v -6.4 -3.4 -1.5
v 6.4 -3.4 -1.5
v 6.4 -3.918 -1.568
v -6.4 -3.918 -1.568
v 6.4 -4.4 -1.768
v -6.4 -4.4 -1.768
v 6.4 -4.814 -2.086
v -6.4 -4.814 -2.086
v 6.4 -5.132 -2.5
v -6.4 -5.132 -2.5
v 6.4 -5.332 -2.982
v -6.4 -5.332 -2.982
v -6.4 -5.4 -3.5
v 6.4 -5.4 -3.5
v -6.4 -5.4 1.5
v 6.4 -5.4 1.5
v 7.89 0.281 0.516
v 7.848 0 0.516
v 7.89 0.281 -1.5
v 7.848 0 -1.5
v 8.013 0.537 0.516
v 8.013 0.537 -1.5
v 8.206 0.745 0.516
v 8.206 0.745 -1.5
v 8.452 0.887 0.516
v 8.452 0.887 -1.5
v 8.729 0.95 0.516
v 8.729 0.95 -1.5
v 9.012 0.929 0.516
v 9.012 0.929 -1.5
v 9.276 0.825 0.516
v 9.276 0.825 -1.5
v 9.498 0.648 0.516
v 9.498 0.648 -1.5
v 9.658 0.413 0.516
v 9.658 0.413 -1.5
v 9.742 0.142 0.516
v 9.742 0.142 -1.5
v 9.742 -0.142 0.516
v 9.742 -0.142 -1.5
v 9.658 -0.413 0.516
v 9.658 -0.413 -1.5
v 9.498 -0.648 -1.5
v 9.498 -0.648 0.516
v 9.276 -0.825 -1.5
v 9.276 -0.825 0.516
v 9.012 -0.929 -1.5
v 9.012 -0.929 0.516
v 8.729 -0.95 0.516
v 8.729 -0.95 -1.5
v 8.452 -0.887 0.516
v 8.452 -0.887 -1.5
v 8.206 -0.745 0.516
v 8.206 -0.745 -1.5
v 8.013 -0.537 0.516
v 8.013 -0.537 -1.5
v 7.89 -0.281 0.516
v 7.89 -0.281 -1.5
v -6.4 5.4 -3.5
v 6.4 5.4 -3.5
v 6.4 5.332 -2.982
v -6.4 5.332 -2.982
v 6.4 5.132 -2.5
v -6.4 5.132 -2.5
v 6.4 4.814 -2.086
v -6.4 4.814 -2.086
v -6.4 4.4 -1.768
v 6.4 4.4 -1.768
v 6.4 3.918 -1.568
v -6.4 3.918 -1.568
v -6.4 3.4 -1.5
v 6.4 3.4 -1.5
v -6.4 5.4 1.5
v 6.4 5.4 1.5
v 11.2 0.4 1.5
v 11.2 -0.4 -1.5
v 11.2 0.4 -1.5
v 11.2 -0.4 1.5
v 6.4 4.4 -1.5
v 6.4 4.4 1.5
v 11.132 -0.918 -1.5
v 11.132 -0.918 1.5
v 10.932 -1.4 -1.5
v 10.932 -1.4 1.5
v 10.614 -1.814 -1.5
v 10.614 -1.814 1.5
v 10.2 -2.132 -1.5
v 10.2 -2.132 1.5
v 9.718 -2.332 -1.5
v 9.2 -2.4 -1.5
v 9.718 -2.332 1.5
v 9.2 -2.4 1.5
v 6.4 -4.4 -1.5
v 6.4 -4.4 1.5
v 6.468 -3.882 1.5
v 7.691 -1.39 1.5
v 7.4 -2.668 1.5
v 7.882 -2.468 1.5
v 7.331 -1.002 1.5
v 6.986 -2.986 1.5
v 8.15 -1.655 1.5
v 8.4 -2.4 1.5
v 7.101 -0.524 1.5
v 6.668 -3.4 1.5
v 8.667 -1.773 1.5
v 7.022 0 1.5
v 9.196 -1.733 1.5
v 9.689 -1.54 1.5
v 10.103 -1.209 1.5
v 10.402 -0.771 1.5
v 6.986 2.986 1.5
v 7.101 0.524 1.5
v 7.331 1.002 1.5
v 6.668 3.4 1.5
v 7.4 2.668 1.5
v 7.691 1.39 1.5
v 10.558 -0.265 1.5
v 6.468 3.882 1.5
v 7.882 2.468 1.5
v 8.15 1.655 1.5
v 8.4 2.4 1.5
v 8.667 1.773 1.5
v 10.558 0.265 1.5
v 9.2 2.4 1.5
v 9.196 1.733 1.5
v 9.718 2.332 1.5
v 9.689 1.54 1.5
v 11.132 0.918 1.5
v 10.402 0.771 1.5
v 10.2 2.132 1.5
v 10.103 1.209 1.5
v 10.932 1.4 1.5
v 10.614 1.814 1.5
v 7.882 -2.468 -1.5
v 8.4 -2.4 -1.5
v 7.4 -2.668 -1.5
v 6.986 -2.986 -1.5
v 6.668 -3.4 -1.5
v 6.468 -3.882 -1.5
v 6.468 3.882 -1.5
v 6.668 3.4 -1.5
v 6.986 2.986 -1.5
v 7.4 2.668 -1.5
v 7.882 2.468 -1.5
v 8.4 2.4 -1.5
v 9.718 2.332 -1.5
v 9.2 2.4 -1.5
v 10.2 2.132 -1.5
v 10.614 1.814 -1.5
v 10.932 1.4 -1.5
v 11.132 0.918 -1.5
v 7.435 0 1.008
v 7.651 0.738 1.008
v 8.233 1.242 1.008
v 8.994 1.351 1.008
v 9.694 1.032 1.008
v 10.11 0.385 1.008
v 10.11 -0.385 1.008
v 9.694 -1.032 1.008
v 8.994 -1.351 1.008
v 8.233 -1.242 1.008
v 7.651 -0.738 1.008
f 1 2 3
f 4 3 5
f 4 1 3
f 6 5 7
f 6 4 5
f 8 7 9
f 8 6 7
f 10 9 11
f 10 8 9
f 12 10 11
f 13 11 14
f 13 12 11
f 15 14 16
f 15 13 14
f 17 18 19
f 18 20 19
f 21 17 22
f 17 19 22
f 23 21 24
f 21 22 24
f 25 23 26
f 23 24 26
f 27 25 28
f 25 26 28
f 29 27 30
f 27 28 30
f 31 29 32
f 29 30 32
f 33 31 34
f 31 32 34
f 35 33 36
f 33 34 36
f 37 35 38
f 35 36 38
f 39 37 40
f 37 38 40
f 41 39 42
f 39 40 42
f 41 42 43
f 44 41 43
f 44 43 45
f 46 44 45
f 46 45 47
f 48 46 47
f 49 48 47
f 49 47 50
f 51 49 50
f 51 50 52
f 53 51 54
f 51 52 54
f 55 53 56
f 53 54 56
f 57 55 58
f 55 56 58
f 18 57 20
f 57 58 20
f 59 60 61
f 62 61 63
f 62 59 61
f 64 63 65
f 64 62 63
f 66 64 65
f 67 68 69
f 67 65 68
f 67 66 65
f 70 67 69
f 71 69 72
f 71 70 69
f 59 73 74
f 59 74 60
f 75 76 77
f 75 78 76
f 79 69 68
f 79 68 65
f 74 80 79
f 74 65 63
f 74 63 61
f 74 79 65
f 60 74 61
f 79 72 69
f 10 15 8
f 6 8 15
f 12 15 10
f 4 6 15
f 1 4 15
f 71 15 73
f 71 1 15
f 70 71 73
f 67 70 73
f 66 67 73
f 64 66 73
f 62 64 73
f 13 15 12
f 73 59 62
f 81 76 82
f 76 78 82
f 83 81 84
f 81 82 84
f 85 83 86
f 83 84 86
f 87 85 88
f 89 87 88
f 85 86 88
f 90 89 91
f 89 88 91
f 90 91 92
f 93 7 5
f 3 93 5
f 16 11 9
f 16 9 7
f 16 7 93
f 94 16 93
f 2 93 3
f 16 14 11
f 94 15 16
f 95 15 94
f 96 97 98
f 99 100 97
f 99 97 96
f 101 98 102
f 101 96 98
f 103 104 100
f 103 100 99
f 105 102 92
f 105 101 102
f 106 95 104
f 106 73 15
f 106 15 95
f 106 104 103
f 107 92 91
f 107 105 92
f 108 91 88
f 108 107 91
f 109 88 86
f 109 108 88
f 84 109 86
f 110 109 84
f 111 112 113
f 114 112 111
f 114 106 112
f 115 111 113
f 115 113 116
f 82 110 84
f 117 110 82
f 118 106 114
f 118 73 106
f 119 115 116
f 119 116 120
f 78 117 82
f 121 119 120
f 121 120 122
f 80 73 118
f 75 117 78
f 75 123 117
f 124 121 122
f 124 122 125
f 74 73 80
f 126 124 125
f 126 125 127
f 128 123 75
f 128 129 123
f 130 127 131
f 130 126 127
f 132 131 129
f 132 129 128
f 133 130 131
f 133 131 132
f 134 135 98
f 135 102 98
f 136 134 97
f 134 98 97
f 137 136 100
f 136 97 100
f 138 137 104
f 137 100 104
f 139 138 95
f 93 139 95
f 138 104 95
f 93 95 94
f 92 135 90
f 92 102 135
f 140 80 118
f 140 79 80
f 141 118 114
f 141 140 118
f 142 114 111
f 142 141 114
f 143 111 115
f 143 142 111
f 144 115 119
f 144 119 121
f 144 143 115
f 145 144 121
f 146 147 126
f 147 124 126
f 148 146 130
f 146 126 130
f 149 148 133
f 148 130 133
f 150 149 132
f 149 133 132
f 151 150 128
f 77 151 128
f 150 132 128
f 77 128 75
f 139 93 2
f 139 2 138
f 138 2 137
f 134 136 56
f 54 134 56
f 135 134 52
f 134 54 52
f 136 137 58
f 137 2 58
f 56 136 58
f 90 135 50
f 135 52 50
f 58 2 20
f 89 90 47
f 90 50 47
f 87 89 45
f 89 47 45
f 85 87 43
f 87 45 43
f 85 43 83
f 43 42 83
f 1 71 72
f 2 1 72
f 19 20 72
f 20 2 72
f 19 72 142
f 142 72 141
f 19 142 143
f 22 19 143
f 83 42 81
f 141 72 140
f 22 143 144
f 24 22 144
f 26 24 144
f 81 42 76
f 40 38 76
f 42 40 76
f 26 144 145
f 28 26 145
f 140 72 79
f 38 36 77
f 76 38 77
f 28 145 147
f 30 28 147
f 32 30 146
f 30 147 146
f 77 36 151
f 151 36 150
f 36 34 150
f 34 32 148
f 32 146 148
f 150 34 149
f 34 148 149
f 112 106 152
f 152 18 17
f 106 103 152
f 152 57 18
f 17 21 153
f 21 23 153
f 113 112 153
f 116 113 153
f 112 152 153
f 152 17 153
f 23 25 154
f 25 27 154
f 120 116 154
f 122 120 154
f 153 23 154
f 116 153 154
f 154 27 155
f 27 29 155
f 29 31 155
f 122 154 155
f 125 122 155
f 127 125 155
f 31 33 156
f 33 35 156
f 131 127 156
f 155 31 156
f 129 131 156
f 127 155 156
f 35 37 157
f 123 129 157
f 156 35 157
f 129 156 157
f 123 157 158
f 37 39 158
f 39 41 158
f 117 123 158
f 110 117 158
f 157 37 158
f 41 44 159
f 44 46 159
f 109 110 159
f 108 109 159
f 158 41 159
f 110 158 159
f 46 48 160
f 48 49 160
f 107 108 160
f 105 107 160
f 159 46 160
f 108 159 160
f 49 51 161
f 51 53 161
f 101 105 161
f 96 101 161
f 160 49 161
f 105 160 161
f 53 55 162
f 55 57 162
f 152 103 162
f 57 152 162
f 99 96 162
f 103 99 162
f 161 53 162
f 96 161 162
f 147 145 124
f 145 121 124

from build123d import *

# Parameters (mm, degrees)
SKETCH1_W                       = 12.8
SKETCH1_H                       = 10.8
SKETCH1_W_2                     = 4.8
SKETCH1_H_2                     = 4.8
BOSS_EXTRUDE1_DEPTH             = 1.5
F_2_CLEARANCE_HOLE1_D           = 1.905
F_2_CLEARANCE_HOLE1_CSINK_D     = 3.556
F_2_CLEARANCE_HOLE1_CSINK_ANGLE = 80
FILLET1_R                       = 2
BOSS_EXTRUDE2_REACH             = 14.524
BOSS_EXTRUDE2_DIRECTION_2_REACH = 14.524


with BuildPart() as part:
    # Sketch1 → Boss-Extrude1 (new, symmetric)
    with BuildSketch(Plane.XY):
        Rectangle(SKETCH1_W, SKETCH1_H)
        with Locations((8.8, 0)):
            Rectangle(SKETCH1_W_2, SKETCH1_H_2)
    extrude(amount=BOSS_EXTRUDE1_DEPTH, both=True)

    # #2 Clearance Hole1 (through all)
    with Locations(Plane.XY.offset(1.5)):
        with Locations((8.8, 0)):
            CounterSinkHole(F_2_CLEARANCE_HOLE1_D / 2, F_2_CLEARANCE_HOLE1_CSINK_D / 2, counter_sink_angle=F_2_CLEARANCE_HOLE1_CSINK_ANGLE)

    # Fillet1
    fillet1_edges = [part.edges().sort_by_distance(p)[0] for p in [
        (6.4, 2.4, 0),
        (11.2, 2.4, 0),
        (11.2, -2.4, 0),
        (6.4, -2.4, 0),
    ]]
    fillet(fillet1_edges, radius=FILLET1_R)

    # Boss-Extrude2: up to this face of the body (flat: up to its plane)
    boss_extrude2_end = Plane(part.part.faces().sort_by_distance((-6.4, 0, 0))[0])
    # Sketch4 → Boss-Extrude2 (add, up to the picked face)
    with BuildSketch(Plane(origin=(0, 0, 0), x_dir=(0, 0, -1), z_dir=(1, 0, 0)), mode=Mode.PRIVATE) as boss_extrude2_sk1:
        with BuildLine():
            Line((1.5, 5.4), (3.5, 5.4))
            ThreePointArc((3.5, 5.4), (2.085786438, 4.814213562), (1.5, 3.4))
            Line((1.5, 3.4), (1.5, 5.4))
        make_face()
    boss_extrude2_tool1 = split(extrude(boss_extrude2_sk1.sketch, amount=-BOSS_EXTRUDE2_REACH, mode=Mode.PRIVATE), bisect_by=boss_extrude2_end, keep=Keep.BOTH, mode=Mode.PRIVATE)
    # Sketch4 → Boss-Extrude2 (add, up to the picked face)
    with BuildSketch(Plane(origin=(0, 0, 0), x_dir=(0, 0, -1), z_dir=(1, 0, 0)), mode=Mode.PRIVATE) as boss_extrude2_sk2:
        with BuildLine():
            Line((1.5, -5.4), (1.5, -3.4))
            ThreePointArc((1.5, -3.4), (2.085786438, -4.814213562), (3.5, -5.4))
            Line((3.5, -5.4), (1.5, -5.4))
        make_face()
    boss_extrude2_tool2 = split(extrude(boss_extrude2_sk2.sketch, amount=-BOSS_EXTRUDE2_REACH, mode=Mode.PRIVATE), bisect_by=boss_extrude2_end, keep=Keep.BOTH, mode=Mode.PRIVATE)
    add(boss_extrude2_tool1.solids().sort_by(Axis((0, 4.953264, -1.946736), (-1, 0, 0)))[0])
    add(boss_extrude2_tool2.solids().sort_by(Axis((0, -4.953264, -1.946736), (-1, 0, 0)))[0])

    # Boss-Extrude2 direction 2: up to this face of the body (flat: up to its plane)
    boss_extrude2_direction_2_end = Plane(part.part.faces().sort_by_distance((6.4, 4.9, 0))[0])
    # Sketch4 → Boss-Extrude2 direction 2 (add, up to the picked face)
    with BuildSketch(Plane(origin=(0, 0, 0), x_dir=(0, 0, -1), z_dir=(1, 0, 0)), mode=Mode.PRIVATE) as boss_extrude2_direction_2_sk1:
        with BuildLine():
            Line((1.5, 5.4), (3.5, 5.4))
            ThreePointArc((3.5, 5.4), (2.085786438, 4.814213562), (1.5, 3.4))
            Line((1.5, 3.4), (1.5, 5.4))
        make_face()
    boss_extrude2_direction_2_tool1 = split(extrude(boss_extrude2_direction_2_sk1.sketch, amount=BOSS_EXTRUDE2_DIRECTION_2_REACH, mode=Mode.PRIVATE), bisect_by=boss_extrude2_direction_2_end, keep=Keep.BOTH, mode=Mode.PRIVATE)
    # Sketch4 → Boss-Extrude2 direction 2 (add, up to the picked face)
    with BuildSketch(Plane(origin=(0, 0, 0), x_dir=(0, 0, -1), z_dir=(1, 0, 0)), mode=Mode.PRIVATE) as boss_extrude2_direction_2_sk2:
        with BuildLine():
            Line((1.5, -5.4), (1.5, -3.4))
            ThreePointArc((1.5, -3.4), (2.085786438, -4.814213562), (3.5, -5.4))
            Line((3.5, -5.4), (1.5, -5.4))
        make_face()
    boss_extrude2_direction_2_tool2 = split(extrude(boss_extrude2_direction_2_sk2.sketch, amount=BOSS_EXTRUDE2_DIRECTION_2_REACH, mode=Mode.PRIVATE), bisect_by=boss_extrude2_direction_2_end, keep=Keep.BOTH, mode=Mode.PRIVATE)
    add(boss_extrude2_direction_2_tool1.solids().sort_by(Axis((0, 4.953264, -1.946736), (1, 0, 0)))[0])
    add(boss_extrude2_direction_2_tool2.solids().sort_by(Axis((0, -4.953264, -1.946736), (1, 0, 0)))[0])


solid = part.part
